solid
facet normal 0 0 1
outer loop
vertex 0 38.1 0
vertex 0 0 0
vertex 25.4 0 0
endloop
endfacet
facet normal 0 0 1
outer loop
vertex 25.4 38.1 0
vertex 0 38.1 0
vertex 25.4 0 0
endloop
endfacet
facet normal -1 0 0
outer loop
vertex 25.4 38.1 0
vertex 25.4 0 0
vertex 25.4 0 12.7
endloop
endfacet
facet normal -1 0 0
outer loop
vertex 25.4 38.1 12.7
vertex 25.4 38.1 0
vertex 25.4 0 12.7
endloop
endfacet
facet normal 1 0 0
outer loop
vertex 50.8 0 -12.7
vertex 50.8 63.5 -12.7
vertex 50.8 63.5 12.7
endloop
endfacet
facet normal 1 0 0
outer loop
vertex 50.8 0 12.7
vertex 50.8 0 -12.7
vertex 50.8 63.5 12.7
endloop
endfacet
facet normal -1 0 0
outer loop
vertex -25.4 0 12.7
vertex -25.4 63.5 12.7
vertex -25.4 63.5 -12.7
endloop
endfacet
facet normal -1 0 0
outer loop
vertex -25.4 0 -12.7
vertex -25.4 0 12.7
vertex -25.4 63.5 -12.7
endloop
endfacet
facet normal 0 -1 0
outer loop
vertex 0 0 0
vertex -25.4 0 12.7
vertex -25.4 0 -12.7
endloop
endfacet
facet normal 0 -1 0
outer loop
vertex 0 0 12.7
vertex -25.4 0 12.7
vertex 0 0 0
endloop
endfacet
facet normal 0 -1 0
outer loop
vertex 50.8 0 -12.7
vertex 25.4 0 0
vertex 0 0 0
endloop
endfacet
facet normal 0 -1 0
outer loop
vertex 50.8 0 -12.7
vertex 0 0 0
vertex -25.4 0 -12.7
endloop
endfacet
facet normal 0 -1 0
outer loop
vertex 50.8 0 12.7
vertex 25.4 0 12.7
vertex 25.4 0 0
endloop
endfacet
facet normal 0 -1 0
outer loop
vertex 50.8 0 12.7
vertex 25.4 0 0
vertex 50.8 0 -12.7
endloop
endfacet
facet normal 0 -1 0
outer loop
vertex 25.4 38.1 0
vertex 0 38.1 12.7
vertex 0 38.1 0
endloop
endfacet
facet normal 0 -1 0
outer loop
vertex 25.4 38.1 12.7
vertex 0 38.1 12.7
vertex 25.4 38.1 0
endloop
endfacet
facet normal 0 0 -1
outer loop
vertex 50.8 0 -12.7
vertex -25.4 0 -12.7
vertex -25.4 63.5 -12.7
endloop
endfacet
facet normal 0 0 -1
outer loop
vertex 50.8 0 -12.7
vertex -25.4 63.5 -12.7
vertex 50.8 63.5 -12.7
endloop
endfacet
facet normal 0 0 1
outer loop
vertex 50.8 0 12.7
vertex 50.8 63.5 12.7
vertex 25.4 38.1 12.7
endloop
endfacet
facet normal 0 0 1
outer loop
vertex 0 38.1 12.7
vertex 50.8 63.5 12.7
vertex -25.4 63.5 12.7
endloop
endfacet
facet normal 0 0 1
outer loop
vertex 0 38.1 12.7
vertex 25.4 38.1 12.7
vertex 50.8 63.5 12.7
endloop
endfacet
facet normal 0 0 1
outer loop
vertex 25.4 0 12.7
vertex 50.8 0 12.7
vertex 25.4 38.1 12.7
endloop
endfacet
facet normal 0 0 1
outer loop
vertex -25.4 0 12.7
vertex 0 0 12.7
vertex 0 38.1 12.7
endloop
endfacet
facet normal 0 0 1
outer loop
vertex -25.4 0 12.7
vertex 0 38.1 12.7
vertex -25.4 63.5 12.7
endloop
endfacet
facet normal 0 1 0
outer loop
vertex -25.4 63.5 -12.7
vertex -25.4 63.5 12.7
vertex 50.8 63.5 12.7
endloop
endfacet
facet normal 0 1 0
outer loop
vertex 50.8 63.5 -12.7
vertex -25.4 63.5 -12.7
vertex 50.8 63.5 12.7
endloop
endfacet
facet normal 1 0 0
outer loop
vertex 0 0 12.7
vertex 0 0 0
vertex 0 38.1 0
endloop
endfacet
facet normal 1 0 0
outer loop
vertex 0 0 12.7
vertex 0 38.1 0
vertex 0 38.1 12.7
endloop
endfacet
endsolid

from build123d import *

# Parameters (mm, degrees)
F1_DEPTH = 63.5
F2_W     = 25.4
F2_H     = 12.7
F3_DEPTH = 38.1


with BuildPart() as f1:
    # F0 (on Front) → F1 (new body)
    with BuildSketch(Plane.XZ):
        Polygon((50.8, 12.7), (0, 12.7), (-25.4, 12.7), (-25.4, 0), (-25.4, -12.7), (50.8, -12.7), (50.8, 0), align=None)
    extrude(amount=-F1_DEPTH)

    # F2 (on face) → F3 (cut)
    with BuildSketch(Plane.XZ):
        with Locations((12.7, 6.35)):
            Rectangle(F2_W, F2_H)
    extrude(amount=-F3_DEPTH, mode=Mode.SUBTRACT)


solid = f1.part
